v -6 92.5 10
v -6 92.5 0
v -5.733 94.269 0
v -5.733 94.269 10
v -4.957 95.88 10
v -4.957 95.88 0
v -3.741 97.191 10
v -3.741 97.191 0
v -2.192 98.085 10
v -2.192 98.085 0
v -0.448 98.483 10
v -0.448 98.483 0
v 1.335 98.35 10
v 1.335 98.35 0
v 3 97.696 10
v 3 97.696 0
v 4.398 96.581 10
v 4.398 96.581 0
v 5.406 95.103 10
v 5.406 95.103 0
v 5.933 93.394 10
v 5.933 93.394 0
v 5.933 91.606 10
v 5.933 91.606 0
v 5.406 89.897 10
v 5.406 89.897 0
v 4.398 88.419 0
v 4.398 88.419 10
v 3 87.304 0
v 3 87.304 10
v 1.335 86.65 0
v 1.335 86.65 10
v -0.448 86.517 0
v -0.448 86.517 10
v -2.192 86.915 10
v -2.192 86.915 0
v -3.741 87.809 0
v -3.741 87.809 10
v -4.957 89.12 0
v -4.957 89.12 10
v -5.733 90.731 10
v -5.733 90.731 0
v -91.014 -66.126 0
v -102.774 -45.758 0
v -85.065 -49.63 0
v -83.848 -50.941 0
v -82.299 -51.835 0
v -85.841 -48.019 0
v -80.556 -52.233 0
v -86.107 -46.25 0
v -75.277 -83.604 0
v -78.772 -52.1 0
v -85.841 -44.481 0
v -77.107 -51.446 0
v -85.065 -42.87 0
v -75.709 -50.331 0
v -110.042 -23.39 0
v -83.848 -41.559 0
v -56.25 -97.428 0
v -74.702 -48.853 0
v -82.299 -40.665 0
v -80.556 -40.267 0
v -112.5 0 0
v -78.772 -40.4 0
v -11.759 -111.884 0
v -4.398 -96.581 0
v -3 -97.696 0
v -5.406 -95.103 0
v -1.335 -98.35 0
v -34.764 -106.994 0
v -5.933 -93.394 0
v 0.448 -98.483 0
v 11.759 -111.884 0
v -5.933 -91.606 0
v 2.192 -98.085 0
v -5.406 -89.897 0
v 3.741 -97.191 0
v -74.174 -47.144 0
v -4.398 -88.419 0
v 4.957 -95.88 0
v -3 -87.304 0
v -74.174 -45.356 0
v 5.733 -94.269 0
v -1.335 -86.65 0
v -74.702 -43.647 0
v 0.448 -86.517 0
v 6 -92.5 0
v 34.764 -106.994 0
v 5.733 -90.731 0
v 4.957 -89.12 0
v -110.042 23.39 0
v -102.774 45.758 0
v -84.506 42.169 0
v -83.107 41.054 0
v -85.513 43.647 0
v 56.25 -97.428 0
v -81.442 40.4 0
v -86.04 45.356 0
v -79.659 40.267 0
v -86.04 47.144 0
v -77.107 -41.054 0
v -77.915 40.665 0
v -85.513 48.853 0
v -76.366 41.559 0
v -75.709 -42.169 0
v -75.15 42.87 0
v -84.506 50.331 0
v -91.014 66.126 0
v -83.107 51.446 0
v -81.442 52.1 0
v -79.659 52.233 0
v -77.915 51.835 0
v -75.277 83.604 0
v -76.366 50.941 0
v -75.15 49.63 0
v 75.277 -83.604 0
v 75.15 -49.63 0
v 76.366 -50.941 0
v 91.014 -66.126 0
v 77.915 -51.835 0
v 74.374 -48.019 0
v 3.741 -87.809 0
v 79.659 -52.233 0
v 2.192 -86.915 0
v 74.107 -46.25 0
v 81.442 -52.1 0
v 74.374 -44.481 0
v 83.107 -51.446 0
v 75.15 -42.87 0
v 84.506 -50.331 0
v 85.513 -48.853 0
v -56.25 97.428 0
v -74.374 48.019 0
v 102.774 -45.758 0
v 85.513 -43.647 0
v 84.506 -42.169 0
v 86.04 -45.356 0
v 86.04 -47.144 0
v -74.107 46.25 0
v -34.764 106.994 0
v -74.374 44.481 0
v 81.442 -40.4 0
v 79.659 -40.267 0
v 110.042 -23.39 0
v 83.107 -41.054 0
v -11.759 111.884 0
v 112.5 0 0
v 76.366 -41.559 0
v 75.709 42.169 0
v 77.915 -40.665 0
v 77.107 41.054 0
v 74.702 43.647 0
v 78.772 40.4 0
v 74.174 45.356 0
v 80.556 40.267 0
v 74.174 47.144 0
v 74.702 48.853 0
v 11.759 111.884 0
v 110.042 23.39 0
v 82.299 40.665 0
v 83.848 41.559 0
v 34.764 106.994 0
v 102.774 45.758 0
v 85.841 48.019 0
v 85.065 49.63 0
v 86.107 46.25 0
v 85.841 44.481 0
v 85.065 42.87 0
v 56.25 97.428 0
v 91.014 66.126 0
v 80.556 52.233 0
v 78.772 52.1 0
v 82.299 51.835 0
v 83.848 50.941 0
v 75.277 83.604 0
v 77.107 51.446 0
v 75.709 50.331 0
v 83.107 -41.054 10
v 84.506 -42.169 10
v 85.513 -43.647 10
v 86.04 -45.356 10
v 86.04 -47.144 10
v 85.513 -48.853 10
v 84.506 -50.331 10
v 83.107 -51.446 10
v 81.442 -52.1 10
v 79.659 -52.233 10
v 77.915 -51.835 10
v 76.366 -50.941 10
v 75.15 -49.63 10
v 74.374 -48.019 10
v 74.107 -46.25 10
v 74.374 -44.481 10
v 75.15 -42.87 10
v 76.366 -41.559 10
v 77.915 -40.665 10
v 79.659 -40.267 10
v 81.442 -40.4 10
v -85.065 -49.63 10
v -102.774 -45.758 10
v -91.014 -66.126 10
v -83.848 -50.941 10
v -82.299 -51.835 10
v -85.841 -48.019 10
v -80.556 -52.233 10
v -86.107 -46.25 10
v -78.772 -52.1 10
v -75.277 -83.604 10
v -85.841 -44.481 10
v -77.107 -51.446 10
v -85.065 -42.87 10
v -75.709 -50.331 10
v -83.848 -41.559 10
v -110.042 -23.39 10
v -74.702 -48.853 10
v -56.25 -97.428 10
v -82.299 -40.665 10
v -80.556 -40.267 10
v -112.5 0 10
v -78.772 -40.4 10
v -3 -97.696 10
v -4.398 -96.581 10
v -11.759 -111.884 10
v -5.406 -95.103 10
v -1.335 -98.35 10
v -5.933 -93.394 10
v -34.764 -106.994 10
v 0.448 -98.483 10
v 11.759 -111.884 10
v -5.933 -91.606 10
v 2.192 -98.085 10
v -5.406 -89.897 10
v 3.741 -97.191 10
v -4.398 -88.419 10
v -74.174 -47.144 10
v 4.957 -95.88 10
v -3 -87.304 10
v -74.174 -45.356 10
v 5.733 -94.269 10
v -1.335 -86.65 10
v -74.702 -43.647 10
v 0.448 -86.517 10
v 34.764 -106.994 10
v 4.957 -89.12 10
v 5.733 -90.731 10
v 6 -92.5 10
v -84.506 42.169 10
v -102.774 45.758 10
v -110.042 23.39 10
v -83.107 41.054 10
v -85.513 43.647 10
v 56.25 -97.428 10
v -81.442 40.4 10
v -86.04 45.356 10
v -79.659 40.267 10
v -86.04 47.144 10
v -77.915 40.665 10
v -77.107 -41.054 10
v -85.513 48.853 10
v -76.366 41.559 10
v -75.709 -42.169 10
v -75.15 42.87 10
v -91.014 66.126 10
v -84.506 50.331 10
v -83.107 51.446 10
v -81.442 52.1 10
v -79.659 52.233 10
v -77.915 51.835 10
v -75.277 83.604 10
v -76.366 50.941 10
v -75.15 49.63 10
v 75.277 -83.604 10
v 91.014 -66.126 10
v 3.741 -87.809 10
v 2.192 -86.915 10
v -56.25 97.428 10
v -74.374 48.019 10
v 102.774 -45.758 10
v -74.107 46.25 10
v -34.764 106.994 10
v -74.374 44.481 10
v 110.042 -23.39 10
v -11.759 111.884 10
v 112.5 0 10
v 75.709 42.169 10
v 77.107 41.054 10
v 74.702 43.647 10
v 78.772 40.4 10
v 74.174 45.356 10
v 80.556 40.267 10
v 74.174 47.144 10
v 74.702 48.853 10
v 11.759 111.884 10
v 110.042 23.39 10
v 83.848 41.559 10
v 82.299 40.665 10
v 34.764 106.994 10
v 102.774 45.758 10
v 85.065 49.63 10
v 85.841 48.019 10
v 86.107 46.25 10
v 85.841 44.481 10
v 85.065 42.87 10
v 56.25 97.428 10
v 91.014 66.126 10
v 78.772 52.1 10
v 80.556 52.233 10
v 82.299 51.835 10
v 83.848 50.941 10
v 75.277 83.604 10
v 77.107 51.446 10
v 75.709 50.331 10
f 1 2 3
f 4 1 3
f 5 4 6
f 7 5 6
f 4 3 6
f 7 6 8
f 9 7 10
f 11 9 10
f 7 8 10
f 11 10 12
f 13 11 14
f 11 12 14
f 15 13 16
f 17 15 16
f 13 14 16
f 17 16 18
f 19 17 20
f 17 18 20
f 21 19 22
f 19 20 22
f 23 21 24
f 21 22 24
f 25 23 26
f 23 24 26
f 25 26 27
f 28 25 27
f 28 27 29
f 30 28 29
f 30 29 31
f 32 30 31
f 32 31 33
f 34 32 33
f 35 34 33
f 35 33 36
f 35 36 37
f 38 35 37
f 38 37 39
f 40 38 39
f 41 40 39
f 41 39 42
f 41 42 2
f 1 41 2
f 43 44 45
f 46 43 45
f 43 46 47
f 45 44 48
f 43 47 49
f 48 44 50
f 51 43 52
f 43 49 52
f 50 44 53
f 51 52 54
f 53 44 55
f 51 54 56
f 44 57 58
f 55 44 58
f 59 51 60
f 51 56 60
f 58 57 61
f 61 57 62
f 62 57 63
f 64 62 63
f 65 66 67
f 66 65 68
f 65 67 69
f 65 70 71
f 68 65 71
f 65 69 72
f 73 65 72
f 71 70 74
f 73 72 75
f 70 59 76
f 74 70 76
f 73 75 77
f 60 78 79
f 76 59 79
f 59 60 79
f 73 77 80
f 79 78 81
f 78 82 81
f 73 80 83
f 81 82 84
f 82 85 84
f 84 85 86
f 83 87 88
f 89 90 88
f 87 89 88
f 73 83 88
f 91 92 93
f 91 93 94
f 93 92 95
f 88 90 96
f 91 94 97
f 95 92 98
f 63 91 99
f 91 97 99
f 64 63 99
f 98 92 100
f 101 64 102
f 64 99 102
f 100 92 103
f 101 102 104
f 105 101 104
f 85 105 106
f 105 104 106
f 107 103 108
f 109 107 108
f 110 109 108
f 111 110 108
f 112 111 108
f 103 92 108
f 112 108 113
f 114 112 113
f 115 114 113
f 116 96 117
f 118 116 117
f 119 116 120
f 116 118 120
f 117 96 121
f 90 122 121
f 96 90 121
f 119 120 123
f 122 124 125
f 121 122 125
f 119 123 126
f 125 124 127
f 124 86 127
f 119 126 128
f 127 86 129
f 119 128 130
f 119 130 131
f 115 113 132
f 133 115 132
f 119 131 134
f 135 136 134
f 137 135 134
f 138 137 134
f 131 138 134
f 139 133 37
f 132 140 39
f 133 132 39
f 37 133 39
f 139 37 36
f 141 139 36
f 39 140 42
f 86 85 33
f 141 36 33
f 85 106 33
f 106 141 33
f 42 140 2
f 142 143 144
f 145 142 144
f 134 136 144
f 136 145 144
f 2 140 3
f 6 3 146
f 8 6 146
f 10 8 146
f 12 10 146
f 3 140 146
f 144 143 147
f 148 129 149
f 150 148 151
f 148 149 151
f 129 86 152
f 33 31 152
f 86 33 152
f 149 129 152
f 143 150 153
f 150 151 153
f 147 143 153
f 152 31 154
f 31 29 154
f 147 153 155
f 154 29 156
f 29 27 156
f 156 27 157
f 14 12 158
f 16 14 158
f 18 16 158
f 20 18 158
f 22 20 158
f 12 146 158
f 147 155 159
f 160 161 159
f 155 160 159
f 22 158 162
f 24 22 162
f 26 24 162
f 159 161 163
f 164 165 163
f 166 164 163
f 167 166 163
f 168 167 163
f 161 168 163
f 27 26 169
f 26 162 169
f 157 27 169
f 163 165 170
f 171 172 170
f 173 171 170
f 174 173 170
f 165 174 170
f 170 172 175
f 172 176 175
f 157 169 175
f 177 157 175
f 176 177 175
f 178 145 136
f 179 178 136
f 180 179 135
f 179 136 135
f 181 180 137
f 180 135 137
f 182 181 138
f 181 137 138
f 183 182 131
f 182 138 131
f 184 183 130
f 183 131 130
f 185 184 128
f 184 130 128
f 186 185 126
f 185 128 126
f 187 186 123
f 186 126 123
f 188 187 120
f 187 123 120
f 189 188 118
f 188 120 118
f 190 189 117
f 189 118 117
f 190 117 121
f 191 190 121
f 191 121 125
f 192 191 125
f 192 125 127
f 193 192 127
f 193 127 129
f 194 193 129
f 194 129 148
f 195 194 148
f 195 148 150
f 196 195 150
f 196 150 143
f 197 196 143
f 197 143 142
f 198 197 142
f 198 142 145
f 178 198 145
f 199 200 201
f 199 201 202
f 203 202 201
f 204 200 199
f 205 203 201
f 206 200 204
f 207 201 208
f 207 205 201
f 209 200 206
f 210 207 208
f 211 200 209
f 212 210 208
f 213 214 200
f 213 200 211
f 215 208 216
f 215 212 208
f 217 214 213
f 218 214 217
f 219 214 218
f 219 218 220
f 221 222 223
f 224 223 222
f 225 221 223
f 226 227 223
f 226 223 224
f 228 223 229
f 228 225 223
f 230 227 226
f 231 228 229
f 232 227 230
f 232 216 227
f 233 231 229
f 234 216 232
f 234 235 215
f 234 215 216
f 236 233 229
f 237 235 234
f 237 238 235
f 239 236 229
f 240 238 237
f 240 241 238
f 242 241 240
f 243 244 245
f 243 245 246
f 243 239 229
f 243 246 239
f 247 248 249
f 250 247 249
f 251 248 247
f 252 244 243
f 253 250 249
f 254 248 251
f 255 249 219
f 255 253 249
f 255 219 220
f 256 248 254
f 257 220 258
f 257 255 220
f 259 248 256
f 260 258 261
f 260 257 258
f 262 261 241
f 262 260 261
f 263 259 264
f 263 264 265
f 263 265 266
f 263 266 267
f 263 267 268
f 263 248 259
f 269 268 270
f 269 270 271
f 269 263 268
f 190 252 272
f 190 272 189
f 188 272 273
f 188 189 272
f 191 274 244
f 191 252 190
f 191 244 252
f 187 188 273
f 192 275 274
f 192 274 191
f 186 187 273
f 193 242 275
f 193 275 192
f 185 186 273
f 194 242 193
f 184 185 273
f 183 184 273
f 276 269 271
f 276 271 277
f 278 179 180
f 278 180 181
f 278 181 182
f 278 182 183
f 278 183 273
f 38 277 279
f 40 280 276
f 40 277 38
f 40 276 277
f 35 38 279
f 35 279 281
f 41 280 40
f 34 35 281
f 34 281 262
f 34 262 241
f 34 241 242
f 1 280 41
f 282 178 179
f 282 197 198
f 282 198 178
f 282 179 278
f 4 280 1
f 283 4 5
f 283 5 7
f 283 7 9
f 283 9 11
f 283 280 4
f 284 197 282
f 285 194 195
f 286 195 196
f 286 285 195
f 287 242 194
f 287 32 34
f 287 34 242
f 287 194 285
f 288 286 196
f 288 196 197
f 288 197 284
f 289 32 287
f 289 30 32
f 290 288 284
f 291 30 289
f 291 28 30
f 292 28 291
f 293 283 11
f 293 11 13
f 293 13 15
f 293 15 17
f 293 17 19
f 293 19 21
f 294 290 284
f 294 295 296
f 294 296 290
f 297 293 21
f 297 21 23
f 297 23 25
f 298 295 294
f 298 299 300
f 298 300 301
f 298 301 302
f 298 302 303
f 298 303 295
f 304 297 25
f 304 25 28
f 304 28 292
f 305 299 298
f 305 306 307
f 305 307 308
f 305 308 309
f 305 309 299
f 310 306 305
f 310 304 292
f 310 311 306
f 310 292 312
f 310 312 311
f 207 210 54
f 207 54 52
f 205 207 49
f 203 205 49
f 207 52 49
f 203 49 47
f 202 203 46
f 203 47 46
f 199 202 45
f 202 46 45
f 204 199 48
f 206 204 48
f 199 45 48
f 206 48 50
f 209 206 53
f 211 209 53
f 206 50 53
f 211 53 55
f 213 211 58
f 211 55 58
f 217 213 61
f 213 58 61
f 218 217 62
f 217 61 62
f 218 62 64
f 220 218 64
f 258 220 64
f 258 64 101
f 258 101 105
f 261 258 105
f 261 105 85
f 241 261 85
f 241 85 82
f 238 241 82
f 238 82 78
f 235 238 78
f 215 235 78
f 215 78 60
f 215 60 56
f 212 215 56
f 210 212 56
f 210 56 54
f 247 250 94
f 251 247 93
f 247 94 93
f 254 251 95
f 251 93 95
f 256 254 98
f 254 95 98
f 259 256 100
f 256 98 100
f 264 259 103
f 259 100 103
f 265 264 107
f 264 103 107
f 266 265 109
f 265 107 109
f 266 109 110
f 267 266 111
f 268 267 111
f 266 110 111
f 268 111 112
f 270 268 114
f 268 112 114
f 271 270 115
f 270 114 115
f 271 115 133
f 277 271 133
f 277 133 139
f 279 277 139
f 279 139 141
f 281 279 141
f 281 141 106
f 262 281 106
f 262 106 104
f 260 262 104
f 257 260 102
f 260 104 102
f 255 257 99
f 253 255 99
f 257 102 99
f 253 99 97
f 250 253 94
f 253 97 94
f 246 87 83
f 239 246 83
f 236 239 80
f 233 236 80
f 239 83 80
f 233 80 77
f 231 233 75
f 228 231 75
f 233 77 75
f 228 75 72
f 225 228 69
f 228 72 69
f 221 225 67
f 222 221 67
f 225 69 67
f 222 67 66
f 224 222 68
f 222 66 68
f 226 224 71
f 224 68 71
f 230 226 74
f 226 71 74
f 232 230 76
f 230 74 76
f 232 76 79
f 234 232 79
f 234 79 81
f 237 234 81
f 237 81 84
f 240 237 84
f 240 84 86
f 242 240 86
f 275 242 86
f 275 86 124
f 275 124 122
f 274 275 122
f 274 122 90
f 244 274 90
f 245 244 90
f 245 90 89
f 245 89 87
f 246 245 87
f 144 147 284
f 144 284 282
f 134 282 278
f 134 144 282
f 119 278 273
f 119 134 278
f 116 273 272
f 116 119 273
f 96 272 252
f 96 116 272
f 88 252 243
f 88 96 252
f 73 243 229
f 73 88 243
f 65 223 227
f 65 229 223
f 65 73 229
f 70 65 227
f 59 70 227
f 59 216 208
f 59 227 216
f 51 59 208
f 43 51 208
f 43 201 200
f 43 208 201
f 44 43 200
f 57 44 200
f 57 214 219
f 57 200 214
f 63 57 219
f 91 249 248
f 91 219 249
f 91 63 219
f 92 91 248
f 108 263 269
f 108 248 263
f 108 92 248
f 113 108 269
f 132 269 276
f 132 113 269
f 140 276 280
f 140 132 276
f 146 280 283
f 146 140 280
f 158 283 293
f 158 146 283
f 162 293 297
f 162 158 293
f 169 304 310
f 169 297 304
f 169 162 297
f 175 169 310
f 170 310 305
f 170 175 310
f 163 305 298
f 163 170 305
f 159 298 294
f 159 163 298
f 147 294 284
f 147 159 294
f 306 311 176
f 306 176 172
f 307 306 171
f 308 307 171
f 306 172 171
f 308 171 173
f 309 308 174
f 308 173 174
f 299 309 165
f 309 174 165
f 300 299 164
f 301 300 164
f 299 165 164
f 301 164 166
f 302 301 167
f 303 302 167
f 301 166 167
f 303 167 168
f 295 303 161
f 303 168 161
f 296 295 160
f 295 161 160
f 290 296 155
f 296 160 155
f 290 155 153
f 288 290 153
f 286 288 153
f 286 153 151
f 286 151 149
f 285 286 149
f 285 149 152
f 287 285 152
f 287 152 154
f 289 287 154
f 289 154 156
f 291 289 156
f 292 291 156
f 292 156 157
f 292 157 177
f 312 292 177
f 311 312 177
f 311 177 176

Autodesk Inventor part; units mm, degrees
ref_plane "YZ Plane" through (0, 0, 0) normal (1, 0, 0) x (0, 1, 0)
ref_plane "XZ Plane" through (0, 0, 0) normal (0, 1, 0) x (-1, 0, 0)
ref_plane "XY Plane" through (0, 0, 0) normal (0, 0, 1) x (1, 0, 0)
sketch "Sketch6" plane through (0, 0, 0) normal (0, 0, 1) x (1, 0, 0)
  circle A0 centre (0, 0) radius 72.5
  circle A1 centre (0, 0) radius 112.5
  dimension "d46" = 145
  dimension "d47" = 225
extrude "Plate1" add sketch "Sketch6" along normal blind 10 contours A0 | A1
sketch "Sketch8" plane through (0, 0, 0) normal (0, 0, -1) x (-1, 0, 0)
  circle A0 centre (0, 92.5) radius 6
  circle A1 centre (0, 0) radius 92.5 construction
  dimension "d51" = 185
  dimension "d50" = 12
extrude "Extrusion6" cut sketch "Sketch8" along normal through all both and the other way through all
pattern_circular "Circular Pattern3" count 6 over 360 about axis through (0, 0, 0) along (0, 0, 1) of "Extrusion6"
equation "\"d47\" = back_steel_circle_диам_центров + back_steel_circle_ширина_кольца"
equation "\"d51\" = back_steel_circle_диам_центров"
equation "\"d45\" = Thickness"
equation "\"BendReliefDepth\" = 0.5 * Thickness"
equation "\"back_steel_circle_диам_центров\" = 185"
equation "\"back_steel_circle_ширина_кольца\" = 40"
equation "\"Thickness\" = 10"
properties part number "NVPH-306 revision cup"
